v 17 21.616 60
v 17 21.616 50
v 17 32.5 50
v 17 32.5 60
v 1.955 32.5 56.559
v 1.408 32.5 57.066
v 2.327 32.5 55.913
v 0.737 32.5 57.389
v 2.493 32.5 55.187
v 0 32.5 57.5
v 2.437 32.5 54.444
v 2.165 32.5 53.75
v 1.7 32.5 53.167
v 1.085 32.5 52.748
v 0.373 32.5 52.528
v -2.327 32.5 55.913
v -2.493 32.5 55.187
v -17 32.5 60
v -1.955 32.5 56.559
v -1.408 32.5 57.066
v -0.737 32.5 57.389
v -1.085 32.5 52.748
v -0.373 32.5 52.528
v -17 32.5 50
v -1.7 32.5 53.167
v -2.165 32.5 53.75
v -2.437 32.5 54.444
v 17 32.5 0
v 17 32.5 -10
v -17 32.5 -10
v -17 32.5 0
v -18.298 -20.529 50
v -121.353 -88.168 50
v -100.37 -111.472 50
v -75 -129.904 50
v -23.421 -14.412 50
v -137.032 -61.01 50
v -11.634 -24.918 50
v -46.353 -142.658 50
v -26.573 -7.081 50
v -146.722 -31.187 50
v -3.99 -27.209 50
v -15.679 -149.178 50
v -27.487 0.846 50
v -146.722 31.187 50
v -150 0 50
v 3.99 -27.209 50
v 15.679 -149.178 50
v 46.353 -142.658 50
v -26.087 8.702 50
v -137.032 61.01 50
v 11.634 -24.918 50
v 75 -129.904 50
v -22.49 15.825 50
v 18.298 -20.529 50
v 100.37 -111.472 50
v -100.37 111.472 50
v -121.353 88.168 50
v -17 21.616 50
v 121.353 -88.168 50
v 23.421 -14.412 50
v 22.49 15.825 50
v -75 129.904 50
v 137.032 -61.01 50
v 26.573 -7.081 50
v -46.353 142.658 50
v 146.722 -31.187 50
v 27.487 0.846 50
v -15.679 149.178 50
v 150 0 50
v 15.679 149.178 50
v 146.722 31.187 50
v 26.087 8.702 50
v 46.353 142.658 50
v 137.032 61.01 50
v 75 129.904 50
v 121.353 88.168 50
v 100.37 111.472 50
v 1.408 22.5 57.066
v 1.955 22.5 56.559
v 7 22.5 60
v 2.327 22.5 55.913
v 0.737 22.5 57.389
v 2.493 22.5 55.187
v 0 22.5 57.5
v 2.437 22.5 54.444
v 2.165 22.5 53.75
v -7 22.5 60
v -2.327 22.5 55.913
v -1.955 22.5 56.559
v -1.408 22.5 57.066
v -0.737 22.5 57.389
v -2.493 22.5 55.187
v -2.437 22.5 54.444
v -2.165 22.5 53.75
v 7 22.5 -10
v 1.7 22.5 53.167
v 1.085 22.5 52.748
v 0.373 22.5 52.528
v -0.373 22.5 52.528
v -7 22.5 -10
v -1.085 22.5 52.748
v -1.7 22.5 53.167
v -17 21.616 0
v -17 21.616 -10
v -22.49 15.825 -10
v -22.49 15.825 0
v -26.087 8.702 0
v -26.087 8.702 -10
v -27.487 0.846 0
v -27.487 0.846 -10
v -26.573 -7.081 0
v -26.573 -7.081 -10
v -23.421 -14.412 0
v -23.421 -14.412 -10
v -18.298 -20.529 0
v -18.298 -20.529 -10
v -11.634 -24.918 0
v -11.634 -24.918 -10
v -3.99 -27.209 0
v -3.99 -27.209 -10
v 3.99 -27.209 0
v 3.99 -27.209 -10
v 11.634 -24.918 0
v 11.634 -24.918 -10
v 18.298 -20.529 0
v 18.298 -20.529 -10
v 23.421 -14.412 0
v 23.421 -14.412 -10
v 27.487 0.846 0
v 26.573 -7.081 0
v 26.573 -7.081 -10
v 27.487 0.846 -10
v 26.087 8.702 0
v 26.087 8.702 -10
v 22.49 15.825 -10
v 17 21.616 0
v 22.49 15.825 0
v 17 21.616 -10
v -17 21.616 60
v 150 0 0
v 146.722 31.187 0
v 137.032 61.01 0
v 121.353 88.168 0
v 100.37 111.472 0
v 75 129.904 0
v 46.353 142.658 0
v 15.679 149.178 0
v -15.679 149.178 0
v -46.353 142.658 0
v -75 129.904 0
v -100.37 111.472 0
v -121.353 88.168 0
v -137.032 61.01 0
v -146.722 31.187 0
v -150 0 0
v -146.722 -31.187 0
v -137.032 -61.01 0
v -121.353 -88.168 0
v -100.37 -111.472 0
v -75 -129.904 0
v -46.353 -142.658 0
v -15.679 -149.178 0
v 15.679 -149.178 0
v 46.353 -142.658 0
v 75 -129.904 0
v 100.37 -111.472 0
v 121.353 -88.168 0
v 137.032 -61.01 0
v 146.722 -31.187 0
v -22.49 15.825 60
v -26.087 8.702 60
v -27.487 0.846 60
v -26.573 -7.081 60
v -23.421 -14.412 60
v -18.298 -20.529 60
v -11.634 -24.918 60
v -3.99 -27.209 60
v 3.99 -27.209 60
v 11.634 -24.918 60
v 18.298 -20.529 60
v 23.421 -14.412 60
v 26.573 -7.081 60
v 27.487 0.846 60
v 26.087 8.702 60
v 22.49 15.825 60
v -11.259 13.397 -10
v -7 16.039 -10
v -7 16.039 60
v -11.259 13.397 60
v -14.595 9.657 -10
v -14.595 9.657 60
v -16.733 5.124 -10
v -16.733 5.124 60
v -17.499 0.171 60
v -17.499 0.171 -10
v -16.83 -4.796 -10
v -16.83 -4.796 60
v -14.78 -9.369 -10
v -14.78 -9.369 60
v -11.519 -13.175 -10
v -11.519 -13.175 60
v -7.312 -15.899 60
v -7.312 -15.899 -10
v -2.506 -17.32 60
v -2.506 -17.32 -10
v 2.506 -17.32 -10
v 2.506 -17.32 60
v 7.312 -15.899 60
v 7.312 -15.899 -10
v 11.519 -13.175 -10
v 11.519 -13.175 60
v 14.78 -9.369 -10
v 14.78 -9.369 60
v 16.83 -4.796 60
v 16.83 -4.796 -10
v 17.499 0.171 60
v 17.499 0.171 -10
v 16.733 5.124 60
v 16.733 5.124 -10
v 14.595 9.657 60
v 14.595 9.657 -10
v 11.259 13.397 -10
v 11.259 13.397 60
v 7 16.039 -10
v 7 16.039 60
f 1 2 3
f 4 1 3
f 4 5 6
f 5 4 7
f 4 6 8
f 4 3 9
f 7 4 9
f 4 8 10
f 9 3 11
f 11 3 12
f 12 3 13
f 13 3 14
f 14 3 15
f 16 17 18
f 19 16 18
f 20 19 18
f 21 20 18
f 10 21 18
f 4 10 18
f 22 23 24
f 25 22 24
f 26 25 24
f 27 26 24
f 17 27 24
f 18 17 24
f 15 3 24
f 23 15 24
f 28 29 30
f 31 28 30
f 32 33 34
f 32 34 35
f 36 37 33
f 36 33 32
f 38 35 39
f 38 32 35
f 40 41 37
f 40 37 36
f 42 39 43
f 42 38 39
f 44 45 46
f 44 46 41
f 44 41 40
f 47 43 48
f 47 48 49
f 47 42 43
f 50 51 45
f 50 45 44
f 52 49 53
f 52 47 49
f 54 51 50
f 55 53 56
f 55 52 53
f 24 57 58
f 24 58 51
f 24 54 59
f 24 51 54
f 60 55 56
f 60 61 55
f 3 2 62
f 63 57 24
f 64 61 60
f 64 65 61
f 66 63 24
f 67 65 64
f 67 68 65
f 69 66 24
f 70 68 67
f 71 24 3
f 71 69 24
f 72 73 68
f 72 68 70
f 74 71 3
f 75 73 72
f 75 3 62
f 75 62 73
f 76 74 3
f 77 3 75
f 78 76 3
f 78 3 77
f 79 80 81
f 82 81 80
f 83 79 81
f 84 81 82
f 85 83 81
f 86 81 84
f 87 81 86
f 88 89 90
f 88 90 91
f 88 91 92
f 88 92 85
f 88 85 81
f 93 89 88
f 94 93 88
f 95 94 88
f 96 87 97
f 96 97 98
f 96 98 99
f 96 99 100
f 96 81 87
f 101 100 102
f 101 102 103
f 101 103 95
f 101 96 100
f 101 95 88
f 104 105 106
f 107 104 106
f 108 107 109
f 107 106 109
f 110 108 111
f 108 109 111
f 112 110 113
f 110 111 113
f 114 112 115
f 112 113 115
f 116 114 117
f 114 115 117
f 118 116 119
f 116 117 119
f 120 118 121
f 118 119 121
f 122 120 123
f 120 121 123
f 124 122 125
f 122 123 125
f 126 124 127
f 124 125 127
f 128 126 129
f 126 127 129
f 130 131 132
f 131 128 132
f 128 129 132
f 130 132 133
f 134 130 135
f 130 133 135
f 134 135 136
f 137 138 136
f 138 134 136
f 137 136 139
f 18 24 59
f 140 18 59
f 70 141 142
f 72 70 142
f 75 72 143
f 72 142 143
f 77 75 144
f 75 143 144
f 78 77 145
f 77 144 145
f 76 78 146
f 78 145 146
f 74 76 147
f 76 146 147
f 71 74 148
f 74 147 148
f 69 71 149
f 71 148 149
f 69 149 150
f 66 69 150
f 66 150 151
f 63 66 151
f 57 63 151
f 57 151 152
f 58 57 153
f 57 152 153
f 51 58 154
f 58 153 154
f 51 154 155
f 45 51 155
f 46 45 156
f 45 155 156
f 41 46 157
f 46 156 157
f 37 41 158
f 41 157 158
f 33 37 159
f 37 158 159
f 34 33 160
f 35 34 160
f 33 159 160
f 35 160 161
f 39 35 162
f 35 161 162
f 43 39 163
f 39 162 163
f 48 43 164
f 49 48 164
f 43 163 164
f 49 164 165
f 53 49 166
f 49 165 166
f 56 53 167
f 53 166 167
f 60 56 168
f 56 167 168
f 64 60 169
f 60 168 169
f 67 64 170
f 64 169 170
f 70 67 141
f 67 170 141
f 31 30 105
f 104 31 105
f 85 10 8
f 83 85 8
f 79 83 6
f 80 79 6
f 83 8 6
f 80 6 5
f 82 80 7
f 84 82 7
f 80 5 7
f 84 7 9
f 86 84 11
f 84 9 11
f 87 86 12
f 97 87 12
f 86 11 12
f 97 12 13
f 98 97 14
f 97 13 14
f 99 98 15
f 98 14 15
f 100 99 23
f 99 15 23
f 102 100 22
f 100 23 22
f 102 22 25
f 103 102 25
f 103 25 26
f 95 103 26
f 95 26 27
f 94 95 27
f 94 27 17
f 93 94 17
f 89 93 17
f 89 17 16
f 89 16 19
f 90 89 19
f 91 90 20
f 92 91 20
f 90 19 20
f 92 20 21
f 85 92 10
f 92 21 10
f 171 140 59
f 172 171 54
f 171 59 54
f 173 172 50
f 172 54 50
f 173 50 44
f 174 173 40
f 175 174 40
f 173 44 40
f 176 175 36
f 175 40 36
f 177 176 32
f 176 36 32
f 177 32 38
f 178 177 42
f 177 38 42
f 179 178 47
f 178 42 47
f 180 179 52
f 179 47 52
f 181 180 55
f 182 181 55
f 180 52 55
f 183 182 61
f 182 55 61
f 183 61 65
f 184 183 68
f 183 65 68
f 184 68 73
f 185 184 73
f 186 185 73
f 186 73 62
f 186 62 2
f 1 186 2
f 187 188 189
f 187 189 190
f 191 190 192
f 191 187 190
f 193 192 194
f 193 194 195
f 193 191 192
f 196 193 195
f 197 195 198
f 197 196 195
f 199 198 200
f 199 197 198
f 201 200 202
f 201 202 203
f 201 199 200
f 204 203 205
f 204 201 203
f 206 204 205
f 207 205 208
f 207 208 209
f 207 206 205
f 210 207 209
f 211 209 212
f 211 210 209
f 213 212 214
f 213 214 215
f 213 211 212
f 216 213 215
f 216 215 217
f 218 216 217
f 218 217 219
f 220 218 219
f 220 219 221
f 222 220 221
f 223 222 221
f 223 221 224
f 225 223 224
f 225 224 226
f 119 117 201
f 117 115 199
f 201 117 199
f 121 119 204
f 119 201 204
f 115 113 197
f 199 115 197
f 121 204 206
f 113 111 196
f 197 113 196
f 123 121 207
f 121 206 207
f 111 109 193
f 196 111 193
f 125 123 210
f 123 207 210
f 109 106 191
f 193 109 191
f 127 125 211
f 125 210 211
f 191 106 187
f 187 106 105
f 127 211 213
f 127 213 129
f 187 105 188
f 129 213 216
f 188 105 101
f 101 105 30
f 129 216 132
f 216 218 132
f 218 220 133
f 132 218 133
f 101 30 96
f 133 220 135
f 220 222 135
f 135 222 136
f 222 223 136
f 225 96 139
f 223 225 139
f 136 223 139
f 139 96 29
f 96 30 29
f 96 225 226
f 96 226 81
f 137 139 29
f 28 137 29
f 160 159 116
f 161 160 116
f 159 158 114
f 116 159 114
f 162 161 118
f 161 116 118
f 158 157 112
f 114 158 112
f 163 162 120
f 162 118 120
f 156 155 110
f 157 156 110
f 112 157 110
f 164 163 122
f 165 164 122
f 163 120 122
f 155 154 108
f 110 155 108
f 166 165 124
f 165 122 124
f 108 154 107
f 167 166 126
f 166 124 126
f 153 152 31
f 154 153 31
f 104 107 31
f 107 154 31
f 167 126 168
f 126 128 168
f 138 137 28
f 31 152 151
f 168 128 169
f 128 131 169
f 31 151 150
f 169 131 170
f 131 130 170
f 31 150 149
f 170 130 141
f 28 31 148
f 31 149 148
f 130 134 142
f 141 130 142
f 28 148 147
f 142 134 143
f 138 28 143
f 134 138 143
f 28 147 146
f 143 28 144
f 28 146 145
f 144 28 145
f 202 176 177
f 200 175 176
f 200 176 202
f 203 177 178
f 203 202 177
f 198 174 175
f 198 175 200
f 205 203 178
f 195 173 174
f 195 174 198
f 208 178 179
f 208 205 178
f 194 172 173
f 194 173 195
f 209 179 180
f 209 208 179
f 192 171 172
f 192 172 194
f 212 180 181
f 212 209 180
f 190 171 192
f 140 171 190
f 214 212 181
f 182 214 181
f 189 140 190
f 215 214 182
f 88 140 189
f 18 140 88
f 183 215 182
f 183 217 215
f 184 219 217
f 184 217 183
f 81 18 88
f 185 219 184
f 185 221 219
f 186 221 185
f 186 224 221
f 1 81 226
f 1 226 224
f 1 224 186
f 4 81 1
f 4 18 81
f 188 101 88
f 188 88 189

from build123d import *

# Parameters (mm, degrees)
SKETCH1_R                = 150
BOSS_EXTRUDE1_DEPTH      = 50
BOSS_EXTRUDE2_DEPTH      = 10
BOSS_EXTRUDE2_DEPTH_BACK = 60
SKETCH3_R                = 2.5
CUT_EXTRUDE1_DEPTH       = 10


with BuildPart() as part:
    # Sketch1 → Boss-Extrude1 (new body)
    with BuildSketch(Plane.XY):
        Circle(SKETCH1_R)
        with BuildLine():
            Line((-7, 22.5), (7, 22.5))
            Line((7, 22.5), (7, 16.039014932))
            ThreePointArc((7, 16.039014932), (0, -17.5), (-7, 16.039014932))
            Line((-7, 16.039014932), (-7, 22.5))
        make_face(mode=Mode.SUBTRACT)
    extrude(amount=BOSS_EXTRUDE1_DEPTH)

    # Sketch2 → Boss-Extrude2 (add, two sides: drawn at the far end of the back side and taken through both)
    with BuildSketch(Plane.XY.offset(50).offset(-BOSS_EXTRUDE2_DEPTH_BACK)):
        with BuildLine():
            Line((17, 21.615966321), (17, 32.5))
            Line((17, 32.5), (-17, 32.5))
            Line((-17, 32.5), (-17, 21.615966321))
            ThreePointArc((-17, 21.615966321), (0, -27.5), (17, 21.615966321))
        make_face()
        with BuildLine():
            Line((7, 16.039014932), (7, 22.5))
            Line((7, 22.5), (-7, 22.5))
            Line((-7, 22.5), (-7, 16.039014932))
            ThreePointArc((-7, 16.039014932), (0, -17.5), (7, 16.039014932))
        make_face(mode=Mode.SUBTRACT)
    extrude(amount=BOSS_EXTRUDE2_DEPTH + BOSS_EXTRUDE2_DEPTH_BACK)

    # Sketch3 → Cut-Extrude1 (cut)
    with BuildSketch(Plane(origin=(0, 32.5, 0), x_dir=(1, 0, 0), z_dir=(0, 1, 0))):
        with Locations(Location((0, -55, 0), (0, 0, 270))):
            Circle(SKETCH3_R)
    extrude(amount=-CUT_EXTRUDE1_DEPTH, mode=Mode.SUBTRACT)


solid = part.part
